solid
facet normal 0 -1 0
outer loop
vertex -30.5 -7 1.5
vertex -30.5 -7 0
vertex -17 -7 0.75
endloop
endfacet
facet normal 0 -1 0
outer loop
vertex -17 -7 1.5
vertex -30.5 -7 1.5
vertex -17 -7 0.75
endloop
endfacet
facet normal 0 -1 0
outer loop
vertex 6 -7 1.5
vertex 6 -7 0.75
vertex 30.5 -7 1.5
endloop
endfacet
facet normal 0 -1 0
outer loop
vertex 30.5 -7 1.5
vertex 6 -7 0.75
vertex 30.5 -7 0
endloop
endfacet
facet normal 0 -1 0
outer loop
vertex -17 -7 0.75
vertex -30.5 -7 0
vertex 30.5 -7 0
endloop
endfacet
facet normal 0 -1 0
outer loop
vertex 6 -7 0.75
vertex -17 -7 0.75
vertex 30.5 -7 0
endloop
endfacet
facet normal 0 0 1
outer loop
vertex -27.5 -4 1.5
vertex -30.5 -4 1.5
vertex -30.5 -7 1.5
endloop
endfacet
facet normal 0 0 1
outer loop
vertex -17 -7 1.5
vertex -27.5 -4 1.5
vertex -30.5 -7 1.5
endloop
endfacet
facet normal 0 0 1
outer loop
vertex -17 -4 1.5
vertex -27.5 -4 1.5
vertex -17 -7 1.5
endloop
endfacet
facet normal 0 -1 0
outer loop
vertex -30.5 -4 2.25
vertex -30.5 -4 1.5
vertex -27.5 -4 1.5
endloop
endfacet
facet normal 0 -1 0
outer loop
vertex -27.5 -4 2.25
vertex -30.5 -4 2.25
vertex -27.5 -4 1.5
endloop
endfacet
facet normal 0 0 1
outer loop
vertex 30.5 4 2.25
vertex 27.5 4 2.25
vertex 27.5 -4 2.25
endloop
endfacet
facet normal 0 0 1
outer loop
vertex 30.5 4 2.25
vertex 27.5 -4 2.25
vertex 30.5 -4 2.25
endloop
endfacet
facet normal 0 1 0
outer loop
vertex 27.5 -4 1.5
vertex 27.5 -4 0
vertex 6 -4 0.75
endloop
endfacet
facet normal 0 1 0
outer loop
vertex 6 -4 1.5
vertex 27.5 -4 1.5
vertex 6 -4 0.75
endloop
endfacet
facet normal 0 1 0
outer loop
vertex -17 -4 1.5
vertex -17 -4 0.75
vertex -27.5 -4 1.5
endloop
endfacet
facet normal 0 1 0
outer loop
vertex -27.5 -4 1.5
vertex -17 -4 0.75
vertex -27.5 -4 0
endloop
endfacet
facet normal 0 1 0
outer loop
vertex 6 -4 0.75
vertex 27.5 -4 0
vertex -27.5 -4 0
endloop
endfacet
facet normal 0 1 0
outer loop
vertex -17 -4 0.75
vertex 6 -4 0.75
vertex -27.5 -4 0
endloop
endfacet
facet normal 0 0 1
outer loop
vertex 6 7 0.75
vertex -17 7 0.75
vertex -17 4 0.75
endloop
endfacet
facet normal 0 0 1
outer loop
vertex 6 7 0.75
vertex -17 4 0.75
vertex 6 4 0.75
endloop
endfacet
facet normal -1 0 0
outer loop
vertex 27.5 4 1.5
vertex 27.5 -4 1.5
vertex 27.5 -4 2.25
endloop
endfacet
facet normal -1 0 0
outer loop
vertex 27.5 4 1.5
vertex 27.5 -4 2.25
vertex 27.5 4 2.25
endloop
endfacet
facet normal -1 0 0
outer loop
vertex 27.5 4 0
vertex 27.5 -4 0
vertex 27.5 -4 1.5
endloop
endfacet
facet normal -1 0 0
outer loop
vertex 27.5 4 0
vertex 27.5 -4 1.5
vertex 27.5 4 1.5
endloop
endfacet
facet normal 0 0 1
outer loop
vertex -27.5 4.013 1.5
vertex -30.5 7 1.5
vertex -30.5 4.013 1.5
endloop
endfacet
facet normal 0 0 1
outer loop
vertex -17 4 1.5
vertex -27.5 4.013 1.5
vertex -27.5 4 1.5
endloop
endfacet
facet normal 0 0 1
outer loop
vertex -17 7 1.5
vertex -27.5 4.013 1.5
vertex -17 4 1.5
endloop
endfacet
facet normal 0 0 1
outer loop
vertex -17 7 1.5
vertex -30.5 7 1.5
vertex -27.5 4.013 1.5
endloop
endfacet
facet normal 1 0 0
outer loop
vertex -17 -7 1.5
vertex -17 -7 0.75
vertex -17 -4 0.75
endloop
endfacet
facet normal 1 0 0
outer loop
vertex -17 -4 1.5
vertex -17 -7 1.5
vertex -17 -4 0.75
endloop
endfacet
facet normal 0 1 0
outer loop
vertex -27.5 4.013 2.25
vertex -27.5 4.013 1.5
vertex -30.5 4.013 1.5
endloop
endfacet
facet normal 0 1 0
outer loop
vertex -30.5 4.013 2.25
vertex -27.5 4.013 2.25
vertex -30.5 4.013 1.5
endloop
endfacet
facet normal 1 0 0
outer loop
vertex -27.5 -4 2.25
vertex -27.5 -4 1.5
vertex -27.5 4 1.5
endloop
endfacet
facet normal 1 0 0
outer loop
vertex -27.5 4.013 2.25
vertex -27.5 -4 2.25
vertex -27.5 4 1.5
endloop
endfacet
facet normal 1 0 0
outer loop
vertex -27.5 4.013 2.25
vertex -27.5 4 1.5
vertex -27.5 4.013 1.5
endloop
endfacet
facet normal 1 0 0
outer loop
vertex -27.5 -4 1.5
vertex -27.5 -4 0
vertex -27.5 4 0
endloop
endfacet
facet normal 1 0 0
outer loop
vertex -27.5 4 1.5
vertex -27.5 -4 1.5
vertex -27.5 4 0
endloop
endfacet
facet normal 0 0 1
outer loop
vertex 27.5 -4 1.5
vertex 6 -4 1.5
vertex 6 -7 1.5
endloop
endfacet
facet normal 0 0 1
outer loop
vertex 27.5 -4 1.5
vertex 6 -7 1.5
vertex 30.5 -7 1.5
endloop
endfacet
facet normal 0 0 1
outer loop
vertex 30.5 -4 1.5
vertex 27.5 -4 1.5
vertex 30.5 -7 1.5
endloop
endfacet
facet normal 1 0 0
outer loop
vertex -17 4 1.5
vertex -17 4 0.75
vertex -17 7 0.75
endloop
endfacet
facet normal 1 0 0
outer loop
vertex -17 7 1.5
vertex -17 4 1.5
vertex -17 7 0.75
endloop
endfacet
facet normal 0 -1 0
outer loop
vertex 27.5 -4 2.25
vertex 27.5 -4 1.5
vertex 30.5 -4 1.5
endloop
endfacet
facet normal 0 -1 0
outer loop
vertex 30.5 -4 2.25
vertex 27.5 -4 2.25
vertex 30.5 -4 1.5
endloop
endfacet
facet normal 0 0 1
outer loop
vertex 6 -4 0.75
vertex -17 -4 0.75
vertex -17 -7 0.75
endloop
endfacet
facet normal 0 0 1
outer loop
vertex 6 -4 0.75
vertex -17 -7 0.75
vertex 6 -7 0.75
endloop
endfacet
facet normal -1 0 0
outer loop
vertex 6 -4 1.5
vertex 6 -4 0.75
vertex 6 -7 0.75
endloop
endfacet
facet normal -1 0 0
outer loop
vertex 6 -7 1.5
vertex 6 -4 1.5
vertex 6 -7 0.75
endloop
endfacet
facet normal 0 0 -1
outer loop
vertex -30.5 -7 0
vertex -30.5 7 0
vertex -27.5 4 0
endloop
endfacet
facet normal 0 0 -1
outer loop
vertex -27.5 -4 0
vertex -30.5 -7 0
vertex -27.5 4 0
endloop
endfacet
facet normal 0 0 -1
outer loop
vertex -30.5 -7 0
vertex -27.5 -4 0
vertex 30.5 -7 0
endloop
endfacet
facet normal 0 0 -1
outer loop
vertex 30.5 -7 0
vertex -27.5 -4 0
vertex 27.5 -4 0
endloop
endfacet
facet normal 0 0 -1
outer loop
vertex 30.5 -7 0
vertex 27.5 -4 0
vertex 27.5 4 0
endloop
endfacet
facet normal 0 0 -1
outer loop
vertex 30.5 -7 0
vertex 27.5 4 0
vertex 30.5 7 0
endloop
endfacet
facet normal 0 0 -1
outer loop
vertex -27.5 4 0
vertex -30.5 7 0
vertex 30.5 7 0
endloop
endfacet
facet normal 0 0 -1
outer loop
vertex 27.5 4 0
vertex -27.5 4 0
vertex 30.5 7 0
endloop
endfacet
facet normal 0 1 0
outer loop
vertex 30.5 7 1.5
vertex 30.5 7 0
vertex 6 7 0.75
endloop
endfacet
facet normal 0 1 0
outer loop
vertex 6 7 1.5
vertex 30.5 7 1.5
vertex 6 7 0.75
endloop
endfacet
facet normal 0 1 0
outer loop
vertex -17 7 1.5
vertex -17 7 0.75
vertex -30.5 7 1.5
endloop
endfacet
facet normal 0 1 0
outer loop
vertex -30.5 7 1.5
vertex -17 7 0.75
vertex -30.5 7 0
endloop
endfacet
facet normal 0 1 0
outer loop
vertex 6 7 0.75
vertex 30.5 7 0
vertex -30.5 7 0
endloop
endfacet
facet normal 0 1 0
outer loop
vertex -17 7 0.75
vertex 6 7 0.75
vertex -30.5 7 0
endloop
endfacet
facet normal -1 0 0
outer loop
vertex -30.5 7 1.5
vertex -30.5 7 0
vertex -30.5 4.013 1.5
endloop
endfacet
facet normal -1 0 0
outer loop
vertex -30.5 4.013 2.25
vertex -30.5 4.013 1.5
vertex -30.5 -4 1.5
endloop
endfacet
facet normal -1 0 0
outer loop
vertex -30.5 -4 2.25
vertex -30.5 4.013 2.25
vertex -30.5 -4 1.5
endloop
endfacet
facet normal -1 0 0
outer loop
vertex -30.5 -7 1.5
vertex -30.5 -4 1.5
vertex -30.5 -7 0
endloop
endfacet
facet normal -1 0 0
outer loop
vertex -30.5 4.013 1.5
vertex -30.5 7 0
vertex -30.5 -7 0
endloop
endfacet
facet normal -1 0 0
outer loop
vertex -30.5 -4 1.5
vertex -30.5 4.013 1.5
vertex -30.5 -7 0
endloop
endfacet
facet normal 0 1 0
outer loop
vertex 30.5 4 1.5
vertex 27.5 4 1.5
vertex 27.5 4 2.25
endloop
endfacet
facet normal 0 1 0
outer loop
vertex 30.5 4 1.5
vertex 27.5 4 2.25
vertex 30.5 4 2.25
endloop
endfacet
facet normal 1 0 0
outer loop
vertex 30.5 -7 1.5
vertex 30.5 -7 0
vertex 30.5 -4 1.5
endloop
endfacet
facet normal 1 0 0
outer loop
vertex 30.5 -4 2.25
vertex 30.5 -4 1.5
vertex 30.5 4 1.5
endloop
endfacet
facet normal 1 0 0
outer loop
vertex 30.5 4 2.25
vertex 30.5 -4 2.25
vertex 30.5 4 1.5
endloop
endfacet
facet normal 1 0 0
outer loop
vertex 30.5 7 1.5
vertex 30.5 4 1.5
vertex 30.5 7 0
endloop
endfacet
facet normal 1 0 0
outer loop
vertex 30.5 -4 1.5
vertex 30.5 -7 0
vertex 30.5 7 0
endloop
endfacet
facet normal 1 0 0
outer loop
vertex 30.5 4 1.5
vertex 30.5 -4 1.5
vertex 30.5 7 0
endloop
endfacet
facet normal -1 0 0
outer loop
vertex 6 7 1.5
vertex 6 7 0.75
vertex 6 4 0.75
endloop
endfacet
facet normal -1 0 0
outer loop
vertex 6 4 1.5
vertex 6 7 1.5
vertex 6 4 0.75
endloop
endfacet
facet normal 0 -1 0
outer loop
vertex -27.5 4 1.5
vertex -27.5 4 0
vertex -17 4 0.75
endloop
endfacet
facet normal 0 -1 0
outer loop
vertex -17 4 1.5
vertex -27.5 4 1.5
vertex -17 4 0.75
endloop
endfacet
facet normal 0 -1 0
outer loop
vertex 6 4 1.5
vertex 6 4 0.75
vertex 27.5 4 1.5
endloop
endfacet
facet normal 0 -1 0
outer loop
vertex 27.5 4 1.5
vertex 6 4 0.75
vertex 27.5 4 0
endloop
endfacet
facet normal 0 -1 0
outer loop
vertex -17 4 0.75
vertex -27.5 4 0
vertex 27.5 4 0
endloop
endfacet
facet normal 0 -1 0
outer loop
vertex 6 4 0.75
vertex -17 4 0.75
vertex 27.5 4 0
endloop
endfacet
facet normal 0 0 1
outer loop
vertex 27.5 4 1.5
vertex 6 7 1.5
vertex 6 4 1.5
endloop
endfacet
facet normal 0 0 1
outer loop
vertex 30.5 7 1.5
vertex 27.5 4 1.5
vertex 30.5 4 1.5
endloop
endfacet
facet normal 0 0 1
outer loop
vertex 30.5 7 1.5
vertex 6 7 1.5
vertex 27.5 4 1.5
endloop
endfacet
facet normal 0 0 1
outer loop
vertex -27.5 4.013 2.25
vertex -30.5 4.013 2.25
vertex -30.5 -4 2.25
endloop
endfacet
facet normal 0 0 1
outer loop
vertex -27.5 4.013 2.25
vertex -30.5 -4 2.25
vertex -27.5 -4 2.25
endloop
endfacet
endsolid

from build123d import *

# Parameters (mm, degrees)
F0_W     = 3
F0_H     = 8
F0_W_2   = 23
F0_H_2   = 3
F1_DEPTH = 0.75
F2_DEPTH = 2.25
F3_DEPTH = 1.5


with BuildPart() as f1:
    # F0 (on Top) → F1 (new body)
    with BuildSketch(Plane.XY):
        with Locations((29, 0)):
            Rectangle(F0_W, F0_H)
        with Locations((-5.5, 5.5)):
            Rectangle(F0_W_2, F0_H_2)
        Polygon((-30.5, 4.013143), (-30.5, -4), (-27.5, -4), (-27.5, 4), (-27.5, 4.013143), align=None)
        with Locations((-5.5, -5.5)):
            Rectangle(F0_W_2, F0_H_2)
        Polygon((-30.5, 7), (-30.5, 4.013143), (-27.5, 4.013143), (-27.5, 4), (-17, 4), (-17, 7), align=None)
    extrude(amount=F1_DEPTH)

    # F0 (on Top) → F2 (join)
    with BuildSketch(Plane.XY):
        Polygon((-30.5, 4.013143), (-30.5, -4), (-27.5, -4), (-27.5, 4), (-27.5, 4.013143), align=None)
        with Locations((29, 0)):
            Rectangle(F0_W, F0_H)
    extrude(amount=F2_DEPTH)

    # F0 (on Top) → F3 (join)
    with BuildSketch(Plane.XY):
        Polygon((-30.5, 7), (-30.5, 4.013143), (-27.5, 4.013143), (-27.5, 4), (-17, 4), (-17, 7), align=None)
        Polygon((27.5, 4), (30.5, 4), (30.5, 7), (6, 7), (6, 4), align=None)
        Polygon((6, -7), (30.5, -7), (30.5, -4), (27.5, -4), (6, -4), align=None)
        Polygon((-30.5, -7), (-17, -7), (-17, -4), (-27.5, -4), (-30.5, -4), align=None)
        Polygon((-30.5, 4.013143), (-30.5, -4), (-27.5, -4), (-27.5, 4), (-27.5, 4.013143), align=None)
        with Locations((29, 0)):
            Rectangle(F0_W, F0_H)
    extrude(amount=F3_DEPTH)


solid = f1.part
